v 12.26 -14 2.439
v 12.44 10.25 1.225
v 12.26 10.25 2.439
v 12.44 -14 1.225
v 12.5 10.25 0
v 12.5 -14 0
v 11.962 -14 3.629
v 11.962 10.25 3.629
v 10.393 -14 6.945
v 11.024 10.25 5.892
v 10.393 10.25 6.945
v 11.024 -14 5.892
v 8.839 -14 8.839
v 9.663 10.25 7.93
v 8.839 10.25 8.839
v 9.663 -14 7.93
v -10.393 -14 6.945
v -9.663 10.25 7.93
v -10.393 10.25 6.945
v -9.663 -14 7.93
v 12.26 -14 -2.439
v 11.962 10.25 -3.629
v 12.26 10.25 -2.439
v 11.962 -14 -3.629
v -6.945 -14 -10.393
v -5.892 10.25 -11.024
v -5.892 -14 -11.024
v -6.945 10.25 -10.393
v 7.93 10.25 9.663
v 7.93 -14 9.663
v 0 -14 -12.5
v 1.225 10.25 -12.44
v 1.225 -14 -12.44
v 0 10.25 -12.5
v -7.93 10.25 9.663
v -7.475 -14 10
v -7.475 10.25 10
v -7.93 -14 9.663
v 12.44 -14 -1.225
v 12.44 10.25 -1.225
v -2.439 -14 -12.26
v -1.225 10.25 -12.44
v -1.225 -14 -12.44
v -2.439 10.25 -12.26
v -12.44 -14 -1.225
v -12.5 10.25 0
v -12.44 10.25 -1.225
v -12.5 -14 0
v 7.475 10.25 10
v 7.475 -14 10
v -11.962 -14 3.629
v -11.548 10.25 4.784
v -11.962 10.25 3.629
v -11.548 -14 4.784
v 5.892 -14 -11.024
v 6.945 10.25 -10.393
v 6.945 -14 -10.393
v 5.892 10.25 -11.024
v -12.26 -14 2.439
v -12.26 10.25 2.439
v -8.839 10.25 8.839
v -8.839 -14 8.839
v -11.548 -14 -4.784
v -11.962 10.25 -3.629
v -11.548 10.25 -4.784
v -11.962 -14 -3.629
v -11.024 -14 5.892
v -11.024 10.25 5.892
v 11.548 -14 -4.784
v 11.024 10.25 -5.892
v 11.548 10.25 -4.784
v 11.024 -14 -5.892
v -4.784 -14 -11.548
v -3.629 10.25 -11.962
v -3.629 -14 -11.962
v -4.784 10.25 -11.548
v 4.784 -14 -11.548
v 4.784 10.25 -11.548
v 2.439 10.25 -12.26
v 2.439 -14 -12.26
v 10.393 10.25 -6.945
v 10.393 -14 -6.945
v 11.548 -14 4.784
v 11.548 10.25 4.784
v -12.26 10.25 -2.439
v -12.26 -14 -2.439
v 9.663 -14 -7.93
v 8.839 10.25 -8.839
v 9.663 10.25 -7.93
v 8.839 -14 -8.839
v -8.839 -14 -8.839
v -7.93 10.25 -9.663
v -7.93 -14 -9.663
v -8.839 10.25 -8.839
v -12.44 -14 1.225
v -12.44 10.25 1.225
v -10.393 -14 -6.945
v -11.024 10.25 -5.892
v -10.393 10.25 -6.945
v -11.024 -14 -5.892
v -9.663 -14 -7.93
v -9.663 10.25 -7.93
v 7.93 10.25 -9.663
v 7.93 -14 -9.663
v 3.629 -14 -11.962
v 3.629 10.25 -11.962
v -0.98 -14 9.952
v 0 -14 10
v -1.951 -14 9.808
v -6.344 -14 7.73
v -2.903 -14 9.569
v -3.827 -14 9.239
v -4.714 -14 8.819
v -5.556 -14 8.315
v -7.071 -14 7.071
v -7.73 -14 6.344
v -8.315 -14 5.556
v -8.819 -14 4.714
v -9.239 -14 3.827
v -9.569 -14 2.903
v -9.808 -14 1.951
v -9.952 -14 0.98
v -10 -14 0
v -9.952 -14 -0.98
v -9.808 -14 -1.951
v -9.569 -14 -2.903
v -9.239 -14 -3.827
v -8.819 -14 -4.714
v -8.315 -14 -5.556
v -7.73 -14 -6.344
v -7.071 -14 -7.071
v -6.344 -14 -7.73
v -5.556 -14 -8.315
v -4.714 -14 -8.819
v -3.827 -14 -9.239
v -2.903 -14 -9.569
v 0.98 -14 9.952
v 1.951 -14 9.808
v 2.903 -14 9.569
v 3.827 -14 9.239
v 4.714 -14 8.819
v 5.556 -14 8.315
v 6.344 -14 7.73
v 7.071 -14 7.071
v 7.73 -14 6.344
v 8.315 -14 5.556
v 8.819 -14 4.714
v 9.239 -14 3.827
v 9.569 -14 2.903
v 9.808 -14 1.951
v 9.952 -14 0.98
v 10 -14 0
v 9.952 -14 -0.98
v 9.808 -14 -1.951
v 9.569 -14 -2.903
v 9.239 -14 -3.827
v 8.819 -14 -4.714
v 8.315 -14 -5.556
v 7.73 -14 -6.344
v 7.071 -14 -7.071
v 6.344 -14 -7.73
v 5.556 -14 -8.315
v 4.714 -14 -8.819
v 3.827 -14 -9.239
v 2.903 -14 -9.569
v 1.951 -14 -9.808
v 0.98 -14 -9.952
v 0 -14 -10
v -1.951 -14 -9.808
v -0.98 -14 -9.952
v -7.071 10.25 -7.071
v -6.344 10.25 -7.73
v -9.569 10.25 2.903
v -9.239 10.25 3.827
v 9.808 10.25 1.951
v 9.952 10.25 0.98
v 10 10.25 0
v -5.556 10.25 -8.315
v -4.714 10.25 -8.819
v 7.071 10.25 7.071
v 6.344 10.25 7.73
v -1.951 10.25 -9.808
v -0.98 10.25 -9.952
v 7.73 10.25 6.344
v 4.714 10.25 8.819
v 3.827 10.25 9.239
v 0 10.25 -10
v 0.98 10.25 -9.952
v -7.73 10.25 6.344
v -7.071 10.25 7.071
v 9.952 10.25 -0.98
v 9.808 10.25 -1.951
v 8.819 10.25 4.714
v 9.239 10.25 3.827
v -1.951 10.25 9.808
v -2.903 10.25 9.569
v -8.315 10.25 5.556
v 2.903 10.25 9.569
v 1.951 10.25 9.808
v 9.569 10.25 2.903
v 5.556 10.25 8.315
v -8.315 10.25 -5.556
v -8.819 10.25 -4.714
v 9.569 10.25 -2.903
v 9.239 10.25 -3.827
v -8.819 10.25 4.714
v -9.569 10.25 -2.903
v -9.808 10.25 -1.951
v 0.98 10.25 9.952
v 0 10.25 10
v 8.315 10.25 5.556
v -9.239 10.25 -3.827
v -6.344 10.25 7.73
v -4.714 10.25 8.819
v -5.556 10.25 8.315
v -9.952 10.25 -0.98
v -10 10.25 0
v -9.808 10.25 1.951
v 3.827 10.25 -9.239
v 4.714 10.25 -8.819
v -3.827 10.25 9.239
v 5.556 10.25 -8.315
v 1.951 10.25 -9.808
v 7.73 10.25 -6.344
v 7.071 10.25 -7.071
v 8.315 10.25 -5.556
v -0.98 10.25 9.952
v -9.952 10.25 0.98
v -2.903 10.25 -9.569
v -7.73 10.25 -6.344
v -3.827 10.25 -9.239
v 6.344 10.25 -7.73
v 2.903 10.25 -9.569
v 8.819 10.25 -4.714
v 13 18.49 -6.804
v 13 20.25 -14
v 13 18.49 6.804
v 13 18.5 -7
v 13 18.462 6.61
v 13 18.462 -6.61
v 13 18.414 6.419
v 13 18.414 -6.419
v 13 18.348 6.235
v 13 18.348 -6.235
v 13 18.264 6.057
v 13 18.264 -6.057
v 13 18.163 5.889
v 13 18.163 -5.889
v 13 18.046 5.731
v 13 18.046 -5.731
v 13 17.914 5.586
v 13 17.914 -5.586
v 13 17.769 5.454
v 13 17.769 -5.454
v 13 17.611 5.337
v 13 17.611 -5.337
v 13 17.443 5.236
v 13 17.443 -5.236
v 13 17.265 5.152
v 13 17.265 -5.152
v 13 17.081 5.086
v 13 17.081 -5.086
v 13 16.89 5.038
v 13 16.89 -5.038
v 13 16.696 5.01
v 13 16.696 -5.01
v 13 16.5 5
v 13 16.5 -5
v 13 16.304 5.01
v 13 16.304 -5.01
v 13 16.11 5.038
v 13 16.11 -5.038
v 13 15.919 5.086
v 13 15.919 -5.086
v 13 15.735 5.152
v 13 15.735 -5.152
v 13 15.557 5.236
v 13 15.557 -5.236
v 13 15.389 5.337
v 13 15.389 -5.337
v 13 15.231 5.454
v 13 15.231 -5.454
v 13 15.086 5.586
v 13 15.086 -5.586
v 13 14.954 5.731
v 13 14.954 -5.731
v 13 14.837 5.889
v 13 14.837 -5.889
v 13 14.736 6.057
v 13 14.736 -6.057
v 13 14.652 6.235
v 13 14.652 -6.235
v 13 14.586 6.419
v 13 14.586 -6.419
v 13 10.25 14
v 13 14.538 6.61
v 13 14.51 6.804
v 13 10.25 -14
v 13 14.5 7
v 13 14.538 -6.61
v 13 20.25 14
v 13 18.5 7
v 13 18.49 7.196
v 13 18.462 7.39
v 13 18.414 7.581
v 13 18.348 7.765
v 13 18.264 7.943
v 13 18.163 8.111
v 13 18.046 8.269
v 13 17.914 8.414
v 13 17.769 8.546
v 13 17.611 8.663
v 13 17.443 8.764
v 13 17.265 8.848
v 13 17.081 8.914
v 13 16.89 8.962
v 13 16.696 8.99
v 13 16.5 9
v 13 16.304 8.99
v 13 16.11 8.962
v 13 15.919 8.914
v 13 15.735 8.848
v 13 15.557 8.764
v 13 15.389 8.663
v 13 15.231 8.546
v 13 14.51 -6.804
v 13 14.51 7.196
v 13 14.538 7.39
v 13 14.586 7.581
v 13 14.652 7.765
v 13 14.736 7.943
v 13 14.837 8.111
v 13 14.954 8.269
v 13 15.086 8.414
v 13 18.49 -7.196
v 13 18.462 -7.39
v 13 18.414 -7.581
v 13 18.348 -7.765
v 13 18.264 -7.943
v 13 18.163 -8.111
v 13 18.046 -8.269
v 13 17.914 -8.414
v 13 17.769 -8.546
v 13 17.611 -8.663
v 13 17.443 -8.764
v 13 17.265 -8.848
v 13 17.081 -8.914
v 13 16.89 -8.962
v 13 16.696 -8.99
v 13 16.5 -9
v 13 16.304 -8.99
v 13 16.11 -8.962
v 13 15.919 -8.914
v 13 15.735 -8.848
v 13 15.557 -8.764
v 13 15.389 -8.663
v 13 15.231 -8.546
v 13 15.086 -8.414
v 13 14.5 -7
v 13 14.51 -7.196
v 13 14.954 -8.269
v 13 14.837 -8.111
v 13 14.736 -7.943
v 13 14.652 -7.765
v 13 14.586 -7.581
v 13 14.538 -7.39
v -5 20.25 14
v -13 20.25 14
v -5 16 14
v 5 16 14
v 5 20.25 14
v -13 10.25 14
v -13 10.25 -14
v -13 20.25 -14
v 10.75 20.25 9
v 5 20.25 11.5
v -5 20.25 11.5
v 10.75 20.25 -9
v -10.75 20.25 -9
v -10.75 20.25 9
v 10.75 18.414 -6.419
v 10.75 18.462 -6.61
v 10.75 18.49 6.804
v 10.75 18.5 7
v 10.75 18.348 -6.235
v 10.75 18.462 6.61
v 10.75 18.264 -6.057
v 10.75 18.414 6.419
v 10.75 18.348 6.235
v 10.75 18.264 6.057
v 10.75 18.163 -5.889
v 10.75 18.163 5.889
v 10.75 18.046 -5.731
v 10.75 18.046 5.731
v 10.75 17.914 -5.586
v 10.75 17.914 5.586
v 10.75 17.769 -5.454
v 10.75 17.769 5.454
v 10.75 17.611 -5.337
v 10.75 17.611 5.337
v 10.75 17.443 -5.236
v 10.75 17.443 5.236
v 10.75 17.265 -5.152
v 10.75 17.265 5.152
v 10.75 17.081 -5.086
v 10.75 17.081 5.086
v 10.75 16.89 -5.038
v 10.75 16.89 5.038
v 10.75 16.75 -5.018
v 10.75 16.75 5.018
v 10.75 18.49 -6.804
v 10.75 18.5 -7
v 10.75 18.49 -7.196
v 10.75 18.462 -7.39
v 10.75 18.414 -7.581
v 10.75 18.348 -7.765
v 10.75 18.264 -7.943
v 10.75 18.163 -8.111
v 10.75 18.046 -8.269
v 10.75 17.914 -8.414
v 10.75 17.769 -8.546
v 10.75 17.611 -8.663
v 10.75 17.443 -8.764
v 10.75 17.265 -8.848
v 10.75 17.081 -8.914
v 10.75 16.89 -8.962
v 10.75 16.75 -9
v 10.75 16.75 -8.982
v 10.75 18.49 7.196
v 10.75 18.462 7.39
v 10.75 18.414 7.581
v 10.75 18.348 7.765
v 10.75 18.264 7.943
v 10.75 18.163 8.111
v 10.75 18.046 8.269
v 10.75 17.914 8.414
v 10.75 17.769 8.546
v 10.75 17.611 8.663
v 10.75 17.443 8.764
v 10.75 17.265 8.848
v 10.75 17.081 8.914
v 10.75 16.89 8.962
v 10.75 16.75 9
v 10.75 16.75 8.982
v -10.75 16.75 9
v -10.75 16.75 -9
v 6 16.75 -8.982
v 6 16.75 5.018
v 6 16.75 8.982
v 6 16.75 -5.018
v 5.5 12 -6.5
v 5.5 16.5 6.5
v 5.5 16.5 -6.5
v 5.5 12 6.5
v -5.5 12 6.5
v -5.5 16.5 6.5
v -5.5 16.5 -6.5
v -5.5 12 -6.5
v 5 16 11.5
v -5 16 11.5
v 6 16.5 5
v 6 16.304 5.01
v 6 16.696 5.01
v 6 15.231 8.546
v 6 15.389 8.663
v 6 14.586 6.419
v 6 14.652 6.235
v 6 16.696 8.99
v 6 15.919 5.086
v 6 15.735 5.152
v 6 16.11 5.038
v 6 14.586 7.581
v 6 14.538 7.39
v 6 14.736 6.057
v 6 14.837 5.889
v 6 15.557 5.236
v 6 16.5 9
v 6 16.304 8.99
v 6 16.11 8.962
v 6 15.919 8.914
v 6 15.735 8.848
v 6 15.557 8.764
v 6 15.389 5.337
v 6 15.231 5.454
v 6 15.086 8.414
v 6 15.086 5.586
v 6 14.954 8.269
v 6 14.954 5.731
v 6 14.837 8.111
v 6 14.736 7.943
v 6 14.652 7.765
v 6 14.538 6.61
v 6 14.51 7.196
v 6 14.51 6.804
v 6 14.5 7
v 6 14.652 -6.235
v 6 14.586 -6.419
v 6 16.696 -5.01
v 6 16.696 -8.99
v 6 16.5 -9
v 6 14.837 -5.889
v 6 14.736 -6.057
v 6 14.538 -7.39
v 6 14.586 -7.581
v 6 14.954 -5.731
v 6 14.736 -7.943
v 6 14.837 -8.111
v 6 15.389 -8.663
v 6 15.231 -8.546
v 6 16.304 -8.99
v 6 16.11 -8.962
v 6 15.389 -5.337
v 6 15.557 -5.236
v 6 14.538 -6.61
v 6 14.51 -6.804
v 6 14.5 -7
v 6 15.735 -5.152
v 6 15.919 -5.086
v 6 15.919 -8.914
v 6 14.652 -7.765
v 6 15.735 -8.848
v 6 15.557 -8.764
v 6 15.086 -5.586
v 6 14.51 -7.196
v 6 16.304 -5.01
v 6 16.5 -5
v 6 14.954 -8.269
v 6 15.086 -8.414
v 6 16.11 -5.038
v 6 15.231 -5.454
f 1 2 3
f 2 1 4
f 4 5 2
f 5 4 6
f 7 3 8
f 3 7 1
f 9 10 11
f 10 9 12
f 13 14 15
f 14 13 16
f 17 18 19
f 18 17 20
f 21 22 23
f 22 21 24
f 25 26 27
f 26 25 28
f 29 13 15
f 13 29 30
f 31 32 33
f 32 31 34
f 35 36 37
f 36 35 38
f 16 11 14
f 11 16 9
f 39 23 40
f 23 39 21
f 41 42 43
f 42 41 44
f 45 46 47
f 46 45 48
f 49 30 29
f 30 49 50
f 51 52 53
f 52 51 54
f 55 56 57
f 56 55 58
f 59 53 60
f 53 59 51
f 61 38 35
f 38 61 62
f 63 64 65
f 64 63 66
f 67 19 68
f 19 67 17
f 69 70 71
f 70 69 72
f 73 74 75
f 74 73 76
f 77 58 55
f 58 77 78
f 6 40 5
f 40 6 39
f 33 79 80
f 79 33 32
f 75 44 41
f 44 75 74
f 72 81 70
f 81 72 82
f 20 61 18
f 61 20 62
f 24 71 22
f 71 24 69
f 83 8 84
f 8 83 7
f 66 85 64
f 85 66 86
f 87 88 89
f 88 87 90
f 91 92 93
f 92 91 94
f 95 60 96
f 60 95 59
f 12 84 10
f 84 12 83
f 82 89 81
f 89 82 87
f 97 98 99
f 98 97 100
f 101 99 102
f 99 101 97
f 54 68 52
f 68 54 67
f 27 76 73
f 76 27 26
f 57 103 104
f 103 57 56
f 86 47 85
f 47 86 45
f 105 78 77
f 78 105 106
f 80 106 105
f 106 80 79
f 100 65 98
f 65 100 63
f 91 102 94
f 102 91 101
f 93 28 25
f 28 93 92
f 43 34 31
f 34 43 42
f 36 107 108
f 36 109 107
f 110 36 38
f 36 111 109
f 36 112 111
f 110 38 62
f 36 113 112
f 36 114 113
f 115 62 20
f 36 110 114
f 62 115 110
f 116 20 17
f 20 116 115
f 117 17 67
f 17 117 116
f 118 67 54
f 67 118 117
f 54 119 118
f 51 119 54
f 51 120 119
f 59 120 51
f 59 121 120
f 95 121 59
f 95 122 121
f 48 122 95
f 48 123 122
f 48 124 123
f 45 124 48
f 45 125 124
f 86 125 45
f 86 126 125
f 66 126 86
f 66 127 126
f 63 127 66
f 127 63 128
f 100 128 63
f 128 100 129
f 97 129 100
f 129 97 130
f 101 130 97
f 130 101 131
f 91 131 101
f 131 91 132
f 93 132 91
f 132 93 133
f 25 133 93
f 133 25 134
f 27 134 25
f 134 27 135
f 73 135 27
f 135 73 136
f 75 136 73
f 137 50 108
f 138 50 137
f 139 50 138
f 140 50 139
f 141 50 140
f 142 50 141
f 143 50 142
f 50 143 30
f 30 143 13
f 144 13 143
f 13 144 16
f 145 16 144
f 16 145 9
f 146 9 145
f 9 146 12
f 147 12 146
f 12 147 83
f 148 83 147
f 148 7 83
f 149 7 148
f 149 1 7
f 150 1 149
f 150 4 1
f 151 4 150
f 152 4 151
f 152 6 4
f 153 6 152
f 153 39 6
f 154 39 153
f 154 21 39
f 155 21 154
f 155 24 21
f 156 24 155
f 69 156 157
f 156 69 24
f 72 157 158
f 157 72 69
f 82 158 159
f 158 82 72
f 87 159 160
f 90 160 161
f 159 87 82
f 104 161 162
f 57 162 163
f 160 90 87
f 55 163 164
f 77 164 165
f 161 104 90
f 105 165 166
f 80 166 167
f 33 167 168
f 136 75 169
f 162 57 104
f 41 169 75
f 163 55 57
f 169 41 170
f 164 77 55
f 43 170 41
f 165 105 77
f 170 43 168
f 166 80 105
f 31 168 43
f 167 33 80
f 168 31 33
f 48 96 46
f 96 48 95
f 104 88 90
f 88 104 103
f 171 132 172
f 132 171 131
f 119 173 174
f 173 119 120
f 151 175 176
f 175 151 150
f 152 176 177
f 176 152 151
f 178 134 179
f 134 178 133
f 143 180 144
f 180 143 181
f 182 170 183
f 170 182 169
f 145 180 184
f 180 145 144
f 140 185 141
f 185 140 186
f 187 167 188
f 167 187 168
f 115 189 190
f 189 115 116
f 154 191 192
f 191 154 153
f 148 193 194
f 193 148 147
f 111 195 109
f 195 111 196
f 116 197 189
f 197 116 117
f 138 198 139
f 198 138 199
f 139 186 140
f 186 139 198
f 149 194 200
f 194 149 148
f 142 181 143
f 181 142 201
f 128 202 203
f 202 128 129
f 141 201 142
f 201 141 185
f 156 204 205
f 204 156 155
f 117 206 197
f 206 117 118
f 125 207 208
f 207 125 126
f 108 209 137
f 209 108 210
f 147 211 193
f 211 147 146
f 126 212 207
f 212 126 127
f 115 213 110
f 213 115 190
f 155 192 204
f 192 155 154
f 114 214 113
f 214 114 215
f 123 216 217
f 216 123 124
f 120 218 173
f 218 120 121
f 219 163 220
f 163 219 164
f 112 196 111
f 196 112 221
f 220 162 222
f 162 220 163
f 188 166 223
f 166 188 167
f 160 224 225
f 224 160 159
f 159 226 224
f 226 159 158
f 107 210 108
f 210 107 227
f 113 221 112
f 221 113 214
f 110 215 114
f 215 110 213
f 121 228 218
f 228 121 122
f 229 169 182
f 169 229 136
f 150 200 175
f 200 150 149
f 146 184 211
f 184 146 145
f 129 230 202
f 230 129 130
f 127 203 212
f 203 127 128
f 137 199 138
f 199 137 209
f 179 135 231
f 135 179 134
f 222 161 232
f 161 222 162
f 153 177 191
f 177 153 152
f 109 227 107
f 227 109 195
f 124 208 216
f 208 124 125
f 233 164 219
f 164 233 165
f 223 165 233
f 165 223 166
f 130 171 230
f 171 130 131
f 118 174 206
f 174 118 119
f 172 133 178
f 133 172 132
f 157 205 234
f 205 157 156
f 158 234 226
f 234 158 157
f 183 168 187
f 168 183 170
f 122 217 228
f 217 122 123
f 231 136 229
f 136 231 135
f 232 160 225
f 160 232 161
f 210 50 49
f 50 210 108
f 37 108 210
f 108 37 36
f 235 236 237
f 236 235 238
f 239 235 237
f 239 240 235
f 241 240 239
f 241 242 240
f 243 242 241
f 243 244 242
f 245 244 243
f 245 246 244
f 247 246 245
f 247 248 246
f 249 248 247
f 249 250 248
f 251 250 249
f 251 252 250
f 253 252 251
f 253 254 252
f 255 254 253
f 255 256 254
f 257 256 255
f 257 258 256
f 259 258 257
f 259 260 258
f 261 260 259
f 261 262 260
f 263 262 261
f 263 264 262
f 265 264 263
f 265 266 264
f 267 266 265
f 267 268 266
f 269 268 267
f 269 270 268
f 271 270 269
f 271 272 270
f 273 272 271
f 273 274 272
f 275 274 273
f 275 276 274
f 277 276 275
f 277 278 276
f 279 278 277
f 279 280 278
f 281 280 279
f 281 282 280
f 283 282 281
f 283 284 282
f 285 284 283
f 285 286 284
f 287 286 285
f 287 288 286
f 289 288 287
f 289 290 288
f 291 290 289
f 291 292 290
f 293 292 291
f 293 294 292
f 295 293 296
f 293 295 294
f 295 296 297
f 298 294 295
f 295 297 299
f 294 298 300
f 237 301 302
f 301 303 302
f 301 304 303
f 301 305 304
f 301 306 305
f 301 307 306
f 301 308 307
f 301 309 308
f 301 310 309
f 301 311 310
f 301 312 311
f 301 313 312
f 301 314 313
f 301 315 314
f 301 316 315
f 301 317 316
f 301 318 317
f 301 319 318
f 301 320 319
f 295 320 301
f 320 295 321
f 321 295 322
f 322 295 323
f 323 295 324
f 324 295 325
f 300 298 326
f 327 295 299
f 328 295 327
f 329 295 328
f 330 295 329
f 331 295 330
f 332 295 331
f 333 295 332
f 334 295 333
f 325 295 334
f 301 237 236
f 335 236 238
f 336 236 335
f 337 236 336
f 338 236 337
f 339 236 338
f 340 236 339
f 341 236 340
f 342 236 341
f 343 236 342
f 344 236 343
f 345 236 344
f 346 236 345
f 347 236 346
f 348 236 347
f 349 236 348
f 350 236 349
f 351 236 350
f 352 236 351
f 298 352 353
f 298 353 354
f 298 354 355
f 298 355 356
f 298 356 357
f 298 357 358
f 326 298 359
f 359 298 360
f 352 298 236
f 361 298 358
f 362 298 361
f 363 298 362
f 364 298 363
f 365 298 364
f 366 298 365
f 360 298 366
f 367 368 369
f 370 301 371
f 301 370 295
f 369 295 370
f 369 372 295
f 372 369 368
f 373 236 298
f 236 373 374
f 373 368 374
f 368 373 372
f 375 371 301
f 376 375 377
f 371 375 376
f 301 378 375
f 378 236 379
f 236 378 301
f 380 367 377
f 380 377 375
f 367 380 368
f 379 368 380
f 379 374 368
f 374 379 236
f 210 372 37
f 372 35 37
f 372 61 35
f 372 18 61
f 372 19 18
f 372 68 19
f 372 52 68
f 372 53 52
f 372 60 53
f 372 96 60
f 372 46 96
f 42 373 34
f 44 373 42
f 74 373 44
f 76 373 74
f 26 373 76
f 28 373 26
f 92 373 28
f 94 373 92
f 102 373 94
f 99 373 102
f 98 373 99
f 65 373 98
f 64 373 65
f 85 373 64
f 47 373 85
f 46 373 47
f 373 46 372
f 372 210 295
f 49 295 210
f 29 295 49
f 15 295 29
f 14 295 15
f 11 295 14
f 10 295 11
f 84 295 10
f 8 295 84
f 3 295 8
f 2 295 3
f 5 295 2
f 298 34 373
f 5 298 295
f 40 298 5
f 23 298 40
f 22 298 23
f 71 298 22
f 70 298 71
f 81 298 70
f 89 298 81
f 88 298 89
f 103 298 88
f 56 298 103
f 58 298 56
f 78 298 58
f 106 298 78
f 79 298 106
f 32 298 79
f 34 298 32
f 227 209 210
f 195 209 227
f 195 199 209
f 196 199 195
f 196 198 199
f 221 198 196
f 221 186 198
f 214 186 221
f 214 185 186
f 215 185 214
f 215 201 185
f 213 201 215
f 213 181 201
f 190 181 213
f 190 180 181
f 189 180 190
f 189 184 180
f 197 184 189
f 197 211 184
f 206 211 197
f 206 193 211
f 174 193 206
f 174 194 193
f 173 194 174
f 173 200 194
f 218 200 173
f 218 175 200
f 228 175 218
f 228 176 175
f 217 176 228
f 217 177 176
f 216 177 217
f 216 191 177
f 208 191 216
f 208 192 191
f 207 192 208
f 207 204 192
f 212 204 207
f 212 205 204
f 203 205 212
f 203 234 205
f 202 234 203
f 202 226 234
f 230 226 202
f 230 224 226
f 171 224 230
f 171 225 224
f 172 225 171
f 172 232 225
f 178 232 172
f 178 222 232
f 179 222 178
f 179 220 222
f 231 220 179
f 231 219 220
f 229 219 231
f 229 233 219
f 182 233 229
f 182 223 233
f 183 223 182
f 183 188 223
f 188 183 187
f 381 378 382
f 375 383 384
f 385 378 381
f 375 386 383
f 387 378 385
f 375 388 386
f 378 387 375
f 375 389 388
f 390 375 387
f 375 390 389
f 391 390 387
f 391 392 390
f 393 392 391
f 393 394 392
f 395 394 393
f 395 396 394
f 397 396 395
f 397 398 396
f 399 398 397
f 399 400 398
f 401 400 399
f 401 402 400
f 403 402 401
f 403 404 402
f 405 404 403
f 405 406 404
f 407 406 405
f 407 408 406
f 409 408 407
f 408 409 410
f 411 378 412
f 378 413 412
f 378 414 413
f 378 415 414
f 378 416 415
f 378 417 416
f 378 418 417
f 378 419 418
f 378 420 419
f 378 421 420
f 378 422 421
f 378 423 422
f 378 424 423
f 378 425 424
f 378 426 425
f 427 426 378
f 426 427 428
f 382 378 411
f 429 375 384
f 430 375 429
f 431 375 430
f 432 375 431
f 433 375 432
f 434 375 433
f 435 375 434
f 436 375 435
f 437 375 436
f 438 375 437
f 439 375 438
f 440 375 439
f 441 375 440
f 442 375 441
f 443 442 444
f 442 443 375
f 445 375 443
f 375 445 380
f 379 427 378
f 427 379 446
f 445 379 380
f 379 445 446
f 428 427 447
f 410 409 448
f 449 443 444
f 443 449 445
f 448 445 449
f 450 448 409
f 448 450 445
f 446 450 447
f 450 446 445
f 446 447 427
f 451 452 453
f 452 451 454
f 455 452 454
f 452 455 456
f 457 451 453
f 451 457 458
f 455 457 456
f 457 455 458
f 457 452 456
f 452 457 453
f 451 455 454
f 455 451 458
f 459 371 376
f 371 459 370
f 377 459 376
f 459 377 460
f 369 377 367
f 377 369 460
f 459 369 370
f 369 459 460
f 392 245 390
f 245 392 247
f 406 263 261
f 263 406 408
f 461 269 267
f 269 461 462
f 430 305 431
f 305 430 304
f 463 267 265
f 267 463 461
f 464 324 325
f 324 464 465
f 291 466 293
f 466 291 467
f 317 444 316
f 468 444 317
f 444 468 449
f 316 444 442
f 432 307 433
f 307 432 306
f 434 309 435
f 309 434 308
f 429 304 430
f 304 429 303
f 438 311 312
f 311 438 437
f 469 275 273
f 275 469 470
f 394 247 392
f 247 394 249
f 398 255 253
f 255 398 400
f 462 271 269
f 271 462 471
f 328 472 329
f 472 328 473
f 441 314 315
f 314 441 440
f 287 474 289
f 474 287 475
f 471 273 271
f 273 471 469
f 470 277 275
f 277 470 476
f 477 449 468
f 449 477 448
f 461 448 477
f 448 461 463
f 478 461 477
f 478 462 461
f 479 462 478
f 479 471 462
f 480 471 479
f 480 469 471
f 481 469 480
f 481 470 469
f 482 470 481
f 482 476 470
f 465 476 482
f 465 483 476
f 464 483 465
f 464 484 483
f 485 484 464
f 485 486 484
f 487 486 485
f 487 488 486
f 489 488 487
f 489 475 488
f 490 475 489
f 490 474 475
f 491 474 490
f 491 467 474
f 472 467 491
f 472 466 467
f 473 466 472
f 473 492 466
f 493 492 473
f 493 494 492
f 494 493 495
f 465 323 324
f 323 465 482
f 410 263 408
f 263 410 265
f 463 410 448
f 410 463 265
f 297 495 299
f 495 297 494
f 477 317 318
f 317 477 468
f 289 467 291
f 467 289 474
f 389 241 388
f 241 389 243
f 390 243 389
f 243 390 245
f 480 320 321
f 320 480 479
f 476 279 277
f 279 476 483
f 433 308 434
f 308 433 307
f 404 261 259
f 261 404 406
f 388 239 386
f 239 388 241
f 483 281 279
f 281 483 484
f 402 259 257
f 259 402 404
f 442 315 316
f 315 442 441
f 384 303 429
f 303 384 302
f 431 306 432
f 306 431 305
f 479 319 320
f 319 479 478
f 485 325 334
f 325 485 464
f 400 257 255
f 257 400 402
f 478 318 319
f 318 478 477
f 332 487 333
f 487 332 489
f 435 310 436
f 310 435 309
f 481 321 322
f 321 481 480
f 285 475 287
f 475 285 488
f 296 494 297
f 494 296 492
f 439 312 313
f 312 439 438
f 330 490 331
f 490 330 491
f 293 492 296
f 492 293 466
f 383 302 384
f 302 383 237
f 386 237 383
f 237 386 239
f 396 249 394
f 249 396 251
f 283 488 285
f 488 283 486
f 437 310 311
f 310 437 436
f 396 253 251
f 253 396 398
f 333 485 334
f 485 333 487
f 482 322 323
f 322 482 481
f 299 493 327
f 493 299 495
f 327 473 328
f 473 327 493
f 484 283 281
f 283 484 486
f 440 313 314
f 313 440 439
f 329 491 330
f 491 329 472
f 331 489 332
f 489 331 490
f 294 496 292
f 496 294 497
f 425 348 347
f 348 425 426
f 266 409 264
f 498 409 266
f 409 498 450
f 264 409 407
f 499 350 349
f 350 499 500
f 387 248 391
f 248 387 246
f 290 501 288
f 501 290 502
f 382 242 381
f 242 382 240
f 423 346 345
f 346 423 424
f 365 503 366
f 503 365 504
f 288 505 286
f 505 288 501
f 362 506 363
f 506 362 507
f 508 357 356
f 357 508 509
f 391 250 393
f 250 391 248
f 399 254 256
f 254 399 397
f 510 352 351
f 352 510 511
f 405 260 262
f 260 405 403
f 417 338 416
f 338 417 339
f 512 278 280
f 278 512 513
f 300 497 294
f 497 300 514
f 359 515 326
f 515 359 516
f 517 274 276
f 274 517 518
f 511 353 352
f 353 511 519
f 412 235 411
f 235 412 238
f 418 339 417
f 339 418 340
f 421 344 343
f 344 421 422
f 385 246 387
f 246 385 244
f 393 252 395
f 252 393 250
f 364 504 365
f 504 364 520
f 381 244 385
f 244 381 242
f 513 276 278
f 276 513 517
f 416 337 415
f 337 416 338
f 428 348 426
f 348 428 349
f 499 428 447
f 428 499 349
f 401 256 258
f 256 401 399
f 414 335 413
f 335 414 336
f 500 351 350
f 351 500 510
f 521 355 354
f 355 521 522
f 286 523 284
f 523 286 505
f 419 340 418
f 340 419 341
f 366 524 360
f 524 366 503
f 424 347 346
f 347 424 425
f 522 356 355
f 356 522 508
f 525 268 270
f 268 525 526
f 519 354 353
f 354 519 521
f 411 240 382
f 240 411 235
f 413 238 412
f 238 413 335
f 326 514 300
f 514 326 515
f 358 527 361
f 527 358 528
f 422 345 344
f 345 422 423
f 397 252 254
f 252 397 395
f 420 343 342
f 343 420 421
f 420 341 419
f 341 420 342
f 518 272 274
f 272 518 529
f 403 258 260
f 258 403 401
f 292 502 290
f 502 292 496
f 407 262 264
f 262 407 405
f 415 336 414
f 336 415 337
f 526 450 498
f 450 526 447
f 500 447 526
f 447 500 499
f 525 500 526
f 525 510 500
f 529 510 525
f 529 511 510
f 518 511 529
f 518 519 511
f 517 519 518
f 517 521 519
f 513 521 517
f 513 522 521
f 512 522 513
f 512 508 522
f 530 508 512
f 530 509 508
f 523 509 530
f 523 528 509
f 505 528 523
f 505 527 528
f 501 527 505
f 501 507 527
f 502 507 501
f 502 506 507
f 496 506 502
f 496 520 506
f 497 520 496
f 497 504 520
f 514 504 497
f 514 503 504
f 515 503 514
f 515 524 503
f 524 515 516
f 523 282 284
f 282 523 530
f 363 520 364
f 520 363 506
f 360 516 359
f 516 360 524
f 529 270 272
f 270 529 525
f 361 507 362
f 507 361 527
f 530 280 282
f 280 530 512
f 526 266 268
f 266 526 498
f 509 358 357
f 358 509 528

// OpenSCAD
/*
  FingerScore - Wearable Ring Enclosure
  Designed for: Seeed Studio XIAO nRF52840
  Includes: 401012 LiPo Battery, 2x 3x6x2.5mm Tactile Buttons
*/

// Parameters
ring_inner_dia = 20; // Internal diameter (Size 10 approx)
ring_thickness = 2.5;
housing_w = 26;
housing_l = 28;
housing_h = 10;
wall_thickness = 1.5;

xiao_w = 21.5;
xiao_l = 18.0;
xiao_h = 4.0;

batt_w = 11;
batt_l = 13;
batt_h = 4.5;

button_hole_d = 4;

$fn = 64;

module ring_base() {
    difference() {
        cylinder(h=housing_l, d=ring_inner_dia + ring_thickness*2, center=true);
        cylinder(h=housing_l+2, d=ring_inner_dia, center=true);
        // Cut top part to attach housing
        translate([0, ring_inner_dia/2 + ring_thickness, 0])
            cube([housing_w+5, ring_thickness*2, housing_l+5], center=true);
    }
}

module housing() {
    difference() {
        // Main Case
        translate([0, ring_inner_dia/2 + ring_thickness/2 + housing_h/2 - 1, 0])
             cube([housing_w, housing_h, housing_l], center=true);
        
        // XIAO Cutout (Top layer)
        translate([0, ring_inner_dia/2 + ring_thickness + housing_h - xiao_h/2 - wall_thickness, 0])
            cube([xiao_w, xiao_h + 0.5, xiao_l], center=true);
        
        // Battery Cutout (Middle layer)
        translate([0, ring_inner_dia/2 + ring_thickness + housing_h - xiao_h - batt_h/2 - wall_thickness - 0.5, 0])
            cube([batt_w, batt_h, batt_l], center=true);
        
        // USB Port Opening
        translate([0, ring_inner_dia/2 + ring_thickness + housing_h - xiao_h/2 - wall_thickness, housing_l/2])
            cube([10, 6, 5], center=true);
            
        // Button Holes
        translate([housing_w/2 - 2, ring_inner_dia/2 + ring_thickness + 4, housing_l/4])
            rotate([0, 90, 0]) cylinder(h=10, d=button_hole_d, center=true);
        translate([housing_w/2 - 2, ring_inner_dia/2 + ring_thickness + 4, -housing_l/4])
            rotate([0, 90, 0]) cylinder(h=10, d=button_hole_d, center=true);
            
        // Inner Ring Connector cleanup
        cylinder(h=housing_l+1, d=ring_inner_dia, center=true);
    }
}

// Render
union() {
    rotate([90, 0, 0]) ring_base();
    housing();
}
